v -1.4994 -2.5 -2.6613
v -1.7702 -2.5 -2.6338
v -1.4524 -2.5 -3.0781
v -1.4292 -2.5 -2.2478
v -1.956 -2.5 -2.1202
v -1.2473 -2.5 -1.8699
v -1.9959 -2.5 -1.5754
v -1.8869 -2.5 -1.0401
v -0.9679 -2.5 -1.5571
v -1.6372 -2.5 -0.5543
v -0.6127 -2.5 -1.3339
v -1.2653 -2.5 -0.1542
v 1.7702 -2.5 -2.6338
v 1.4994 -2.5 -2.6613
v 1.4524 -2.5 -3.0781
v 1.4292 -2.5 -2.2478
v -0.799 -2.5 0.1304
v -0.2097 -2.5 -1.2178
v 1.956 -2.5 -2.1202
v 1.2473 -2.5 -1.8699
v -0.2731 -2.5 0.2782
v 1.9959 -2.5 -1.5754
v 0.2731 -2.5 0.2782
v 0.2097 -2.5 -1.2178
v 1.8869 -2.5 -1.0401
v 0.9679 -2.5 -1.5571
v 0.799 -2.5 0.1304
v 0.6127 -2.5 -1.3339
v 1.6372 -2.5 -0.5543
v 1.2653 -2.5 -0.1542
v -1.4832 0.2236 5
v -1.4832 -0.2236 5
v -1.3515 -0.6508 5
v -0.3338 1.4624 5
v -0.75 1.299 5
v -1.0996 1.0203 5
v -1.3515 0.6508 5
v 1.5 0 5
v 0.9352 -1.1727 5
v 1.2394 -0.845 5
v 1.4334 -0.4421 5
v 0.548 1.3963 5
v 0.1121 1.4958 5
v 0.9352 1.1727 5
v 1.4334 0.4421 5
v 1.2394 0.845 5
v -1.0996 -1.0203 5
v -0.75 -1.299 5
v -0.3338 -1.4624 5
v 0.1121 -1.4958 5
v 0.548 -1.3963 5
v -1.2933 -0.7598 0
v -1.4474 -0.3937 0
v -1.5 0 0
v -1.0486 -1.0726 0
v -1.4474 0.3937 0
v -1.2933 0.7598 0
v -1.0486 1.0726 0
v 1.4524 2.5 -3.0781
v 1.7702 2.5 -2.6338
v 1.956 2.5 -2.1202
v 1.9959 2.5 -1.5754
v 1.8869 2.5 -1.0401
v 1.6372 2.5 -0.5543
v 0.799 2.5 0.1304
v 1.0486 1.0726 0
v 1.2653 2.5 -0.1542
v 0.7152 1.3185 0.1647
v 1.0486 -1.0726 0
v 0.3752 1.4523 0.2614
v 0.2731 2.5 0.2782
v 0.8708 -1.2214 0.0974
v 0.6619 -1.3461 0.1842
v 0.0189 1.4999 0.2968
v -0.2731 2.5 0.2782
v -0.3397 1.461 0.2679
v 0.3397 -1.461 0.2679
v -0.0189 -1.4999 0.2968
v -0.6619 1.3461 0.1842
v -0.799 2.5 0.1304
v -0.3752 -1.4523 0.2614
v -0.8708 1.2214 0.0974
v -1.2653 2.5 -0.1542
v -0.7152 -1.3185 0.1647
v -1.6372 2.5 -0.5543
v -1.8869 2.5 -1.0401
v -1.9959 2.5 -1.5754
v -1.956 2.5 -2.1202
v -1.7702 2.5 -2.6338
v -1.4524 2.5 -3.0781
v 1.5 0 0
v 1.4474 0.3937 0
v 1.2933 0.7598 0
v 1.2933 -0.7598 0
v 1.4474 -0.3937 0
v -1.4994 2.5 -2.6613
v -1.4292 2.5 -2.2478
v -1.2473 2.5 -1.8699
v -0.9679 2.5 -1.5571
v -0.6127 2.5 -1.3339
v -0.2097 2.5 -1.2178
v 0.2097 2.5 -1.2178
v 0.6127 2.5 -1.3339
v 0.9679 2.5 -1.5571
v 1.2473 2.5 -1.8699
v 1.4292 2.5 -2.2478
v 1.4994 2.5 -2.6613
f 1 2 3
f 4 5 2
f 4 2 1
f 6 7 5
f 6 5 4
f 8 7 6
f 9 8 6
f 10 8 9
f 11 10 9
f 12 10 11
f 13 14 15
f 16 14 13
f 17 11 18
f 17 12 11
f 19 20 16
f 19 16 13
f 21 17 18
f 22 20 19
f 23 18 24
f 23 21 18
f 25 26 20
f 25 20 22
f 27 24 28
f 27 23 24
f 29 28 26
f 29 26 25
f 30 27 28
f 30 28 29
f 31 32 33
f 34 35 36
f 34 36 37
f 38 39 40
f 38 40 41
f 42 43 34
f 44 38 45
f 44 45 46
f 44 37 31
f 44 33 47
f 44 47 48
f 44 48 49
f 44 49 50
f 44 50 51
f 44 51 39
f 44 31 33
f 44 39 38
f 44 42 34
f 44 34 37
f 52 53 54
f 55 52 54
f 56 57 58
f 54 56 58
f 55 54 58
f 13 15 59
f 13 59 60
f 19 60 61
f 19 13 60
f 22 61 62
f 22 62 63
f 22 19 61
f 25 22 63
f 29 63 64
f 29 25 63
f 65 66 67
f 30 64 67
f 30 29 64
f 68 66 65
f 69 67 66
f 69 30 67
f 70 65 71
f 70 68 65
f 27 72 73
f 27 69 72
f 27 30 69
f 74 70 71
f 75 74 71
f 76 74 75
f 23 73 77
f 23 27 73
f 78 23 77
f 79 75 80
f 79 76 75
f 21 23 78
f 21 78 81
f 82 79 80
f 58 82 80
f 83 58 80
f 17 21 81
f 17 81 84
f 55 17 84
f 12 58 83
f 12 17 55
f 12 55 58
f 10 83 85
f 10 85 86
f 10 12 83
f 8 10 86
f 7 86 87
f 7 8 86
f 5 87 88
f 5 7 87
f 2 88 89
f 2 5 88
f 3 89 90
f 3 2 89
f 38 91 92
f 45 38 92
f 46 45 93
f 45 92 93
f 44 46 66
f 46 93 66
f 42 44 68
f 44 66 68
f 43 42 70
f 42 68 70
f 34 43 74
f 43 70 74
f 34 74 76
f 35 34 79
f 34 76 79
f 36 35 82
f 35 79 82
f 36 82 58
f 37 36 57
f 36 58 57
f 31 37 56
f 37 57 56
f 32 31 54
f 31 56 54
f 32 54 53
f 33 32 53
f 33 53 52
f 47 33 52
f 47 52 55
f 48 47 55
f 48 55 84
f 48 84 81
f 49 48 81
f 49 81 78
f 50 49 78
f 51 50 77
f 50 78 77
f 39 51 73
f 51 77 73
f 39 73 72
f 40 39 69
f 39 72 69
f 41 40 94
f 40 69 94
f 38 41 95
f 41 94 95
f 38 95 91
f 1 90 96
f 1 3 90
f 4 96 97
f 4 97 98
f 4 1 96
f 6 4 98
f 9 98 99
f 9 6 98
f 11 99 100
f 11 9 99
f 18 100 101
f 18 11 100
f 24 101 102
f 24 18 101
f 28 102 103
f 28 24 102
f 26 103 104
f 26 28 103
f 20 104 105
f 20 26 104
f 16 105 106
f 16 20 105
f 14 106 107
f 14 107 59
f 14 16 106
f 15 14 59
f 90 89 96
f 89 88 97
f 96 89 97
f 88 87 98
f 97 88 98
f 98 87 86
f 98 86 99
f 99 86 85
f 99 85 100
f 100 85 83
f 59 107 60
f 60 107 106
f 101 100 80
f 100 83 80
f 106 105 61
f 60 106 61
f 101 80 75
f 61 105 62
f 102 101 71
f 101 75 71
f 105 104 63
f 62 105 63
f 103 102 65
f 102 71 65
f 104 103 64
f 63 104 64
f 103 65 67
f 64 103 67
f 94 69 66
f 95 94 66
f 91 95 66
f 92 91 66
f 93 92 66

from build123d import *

# Parameters (mm, degrees)
F1_DEPTH = 2.5
F2_R     = 1.5
F3_DEPTH = 5


with BuildPart() as f1:
    # F0 (on Front) → F1 (new body, symmetric)
    with BuildSketch(Plane.XZ):
        with BuildLine():
            ThreePointArc((-1.452369, -3.078081), (0, -1.203081), (1.452369, -3.078081))
            ThreePointArc((1.452369, -3.078081), (0, 0.296919), (-1.452369, -3.078081))
        make_face()
    extrude(amount=F1_DEPTH, both=True)

    # F2 (on Top) → F3 (join)
    with BuildSketch(Plane.XY):
        Circle(F2_R)
    extrude(amount=F3_DEPTH)


solid = f1.part
